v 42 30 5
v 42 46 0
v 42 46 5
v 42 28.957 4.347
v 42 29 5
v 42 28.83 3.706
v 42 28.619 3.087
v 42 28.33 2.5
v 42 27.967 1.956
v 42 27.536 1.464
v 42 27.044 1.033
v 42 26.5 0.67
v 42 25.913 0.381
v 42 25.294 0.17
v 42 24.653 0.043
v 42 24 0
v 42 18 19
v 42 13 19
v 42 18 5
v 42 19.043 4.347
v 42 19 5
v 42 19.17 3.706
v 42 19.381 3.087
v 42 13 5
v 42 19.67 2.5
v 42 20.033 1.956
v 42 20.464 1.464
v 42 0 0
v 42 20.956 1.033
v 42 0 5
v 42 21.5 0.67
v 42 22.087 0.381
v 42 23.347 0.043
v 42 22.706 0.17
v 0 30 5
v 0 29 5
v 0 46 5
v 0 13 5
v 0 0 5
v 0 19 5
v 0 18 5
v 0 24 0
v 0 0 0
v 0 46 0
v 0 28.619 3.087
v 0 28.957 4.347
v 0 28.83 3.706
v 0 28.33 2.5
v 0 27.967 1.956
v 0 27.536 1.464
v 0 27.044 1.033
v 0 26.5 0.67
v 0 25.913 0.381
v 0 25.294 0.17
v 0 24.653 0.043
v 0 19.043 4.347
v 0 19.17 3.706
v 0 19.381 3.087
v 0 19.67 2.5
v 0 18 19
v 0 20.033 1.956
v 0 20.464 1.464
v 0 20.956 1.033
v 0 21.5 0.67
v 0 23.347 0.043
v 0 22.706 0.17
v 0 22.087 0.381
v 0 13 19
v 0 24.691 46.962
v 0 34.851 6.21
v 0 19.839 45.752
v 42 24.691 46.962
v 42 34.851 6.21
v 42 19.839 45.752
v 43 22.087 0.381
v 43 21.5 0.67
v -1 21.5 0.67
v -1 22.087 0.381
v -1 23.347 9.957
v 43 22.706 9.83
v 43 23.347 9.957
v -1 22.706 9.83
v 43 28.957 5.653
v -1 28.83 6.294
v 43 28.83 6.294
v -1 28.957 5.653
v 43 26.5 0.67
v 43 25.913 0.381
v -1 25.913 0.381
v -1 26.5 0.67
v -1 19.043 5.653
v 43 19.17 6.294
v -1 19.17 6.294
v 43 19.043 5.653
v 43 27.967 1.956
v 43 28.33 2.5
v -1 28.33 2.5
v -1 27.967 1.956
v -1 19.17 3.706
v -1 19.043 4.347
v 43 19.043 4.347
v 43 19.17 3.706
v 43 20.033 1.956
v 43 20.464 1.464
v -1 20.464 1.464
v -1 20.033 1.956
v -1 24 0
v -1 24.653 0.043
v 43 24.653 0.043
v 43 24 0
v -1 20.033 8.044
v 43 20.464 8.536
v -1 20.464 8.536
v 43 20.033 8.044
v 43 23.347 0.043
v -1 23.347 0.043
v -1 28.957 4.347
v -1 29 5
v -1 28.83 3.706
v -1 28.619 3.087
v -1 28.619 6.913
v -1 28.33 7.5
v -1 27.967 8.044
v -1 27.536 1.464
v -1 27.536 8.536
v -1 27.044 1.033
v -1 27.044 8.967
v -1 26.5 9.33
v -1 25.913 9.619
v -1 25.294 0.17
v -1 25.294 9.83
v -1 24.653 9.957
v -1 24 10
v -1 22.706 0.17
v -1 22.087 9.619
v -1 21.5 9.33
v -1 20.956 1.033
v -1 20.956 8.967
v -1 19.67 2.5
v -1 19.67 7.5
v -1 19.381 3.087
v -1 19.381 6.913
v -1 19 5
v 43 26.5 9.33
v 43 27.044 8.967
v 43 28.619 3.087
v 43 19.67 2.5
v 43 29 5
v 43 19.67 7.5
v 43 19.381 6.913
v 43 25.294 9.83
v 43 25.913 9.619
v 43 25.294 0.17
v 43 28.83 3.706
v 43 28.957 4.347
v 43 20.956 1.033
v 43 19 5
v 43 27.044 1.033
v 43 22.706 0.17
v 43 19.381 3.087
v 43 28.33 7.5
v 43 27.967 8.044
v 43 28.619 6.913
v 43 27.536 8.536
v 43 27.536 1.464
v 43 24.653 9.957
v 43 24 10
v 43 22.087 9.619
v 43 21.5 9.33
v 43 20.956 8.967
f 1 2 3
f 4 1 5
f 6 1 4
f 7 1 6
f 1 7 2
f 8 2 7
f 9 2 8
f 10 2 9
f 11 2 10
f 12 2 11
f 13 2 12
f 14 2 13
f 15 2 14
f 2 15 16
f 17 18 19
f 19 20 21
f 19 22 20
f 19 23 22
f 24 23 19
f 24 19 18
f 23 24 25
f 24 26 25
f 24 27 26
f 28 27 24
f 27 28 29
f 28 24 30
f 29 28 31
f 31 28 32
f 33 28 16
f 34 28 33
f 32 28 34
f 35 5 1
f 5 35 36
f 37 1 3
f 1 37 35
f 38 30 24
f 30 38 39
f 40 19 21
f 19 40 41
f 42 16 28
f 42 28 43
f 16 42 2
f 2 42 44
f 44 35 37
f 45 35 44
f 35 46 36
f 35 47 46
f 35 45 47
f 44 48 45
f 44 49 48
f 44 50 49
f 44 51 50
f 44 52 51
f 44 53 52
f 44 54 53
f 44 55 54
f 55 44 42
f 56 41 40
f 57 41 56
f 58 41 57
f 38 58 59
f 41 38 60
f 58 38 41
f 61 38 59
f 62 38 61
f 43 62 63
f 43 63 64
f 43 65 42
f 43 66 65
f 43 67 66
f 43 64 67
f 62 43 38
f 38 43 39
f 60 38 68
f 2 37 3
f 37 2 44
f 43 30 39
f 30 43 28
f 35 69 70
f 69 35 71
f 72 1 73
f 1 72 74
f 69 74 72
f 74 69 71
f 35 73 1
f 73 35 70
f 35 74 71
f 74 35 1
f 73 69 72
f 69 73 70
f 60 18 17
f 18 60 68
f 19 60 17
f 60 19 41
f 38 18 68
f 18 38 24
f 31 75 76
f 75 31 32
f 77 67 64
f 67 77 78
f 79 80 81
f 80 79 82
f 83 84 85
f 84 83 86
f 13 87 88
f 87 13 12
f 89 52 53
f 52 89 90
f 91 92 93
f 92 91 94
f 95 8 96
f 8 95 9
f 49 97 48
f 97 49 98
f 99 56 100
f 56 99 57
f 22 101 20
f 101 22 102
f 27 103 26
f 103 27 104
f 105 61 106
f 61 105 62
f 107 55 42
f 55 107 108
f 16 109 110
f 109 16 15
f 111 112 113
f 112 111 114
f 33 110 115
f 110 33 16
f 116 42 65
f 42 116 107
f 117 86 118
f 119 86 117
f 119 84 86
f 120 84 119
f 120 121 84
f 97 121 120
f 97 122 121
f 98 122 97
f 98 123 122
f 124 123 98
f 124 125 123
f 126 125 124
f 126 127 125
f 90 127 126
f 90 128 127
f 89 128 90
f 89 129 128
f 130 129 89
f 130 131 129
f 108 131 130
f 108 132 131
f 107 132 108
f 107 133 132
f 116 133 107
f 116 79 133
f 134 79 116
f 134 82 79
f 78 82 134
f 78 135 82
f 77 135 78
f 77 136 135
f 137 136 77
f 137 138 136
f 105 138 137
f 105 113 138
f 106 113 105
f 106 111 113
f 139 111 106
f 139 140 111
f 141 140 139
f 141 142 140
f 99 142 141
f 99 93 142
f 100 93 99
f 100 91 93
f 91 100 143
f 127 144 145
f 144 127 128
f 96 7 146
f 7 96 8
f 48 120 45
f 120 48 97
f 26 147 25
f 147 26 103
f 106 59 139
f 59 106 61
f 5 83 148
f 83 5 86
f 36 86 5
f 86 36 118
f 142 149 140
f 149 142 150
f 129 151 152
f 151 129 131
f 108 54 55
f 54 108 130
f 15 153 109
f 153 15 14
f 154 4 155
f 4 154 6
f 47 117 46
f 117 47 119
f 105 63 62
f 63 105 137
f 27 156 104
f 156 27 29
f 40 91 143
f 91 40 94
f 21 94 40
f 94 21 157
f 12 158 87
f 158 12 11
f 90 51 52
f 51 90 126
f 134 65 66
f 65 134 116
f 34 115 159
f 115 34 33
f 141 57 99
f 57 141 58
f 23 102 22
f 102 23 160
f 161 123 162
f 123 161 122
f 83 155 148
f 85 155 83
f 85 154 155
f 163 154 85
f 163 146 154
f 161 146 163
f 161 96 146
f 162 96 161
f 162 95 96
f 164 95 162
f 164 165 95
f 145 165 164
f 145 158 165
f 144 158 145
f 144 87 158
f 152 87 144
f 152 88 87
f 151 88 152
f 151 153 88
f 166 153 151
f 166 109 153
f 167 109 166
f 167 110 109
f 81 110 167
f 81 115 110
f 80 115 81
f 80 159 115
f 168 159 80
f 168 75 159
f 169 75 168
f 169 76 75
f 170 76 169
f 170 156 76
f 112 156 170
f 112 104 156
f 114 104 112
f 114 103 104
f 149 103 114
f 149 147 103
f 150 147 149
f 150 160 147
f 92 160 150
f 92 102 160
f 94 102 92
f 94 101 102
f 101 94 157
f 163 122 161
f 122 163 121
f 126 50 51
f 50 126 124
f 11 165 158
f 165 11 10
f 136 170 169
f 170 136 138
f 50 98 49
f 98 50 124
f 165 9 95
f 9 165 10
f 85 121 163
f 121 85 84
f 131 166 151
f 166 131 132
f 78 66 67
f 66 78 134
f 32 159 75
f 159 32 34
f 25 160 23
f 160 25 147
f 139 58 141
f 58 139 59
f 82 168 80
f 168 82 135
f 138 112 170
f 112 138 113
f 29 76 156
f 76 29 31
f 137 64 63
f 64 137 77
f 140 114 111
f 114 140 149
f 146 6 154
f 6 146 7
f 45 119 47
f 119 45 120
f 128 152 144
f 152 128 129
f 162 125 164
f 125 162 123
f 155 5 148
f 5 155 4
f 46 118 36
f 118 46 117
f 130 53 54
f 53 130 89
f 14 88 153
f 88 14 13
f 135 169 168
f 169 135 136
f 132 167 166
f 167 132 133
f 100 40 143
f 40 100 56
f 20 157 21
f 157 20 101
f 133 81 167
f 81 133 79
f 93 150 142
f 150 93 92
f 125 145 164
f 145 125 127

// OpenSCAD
// =====================================================================
//  DESK SETUP PACK  — part = "earbuds_stand" | "key_mail" | "cable_drop"
//  Units mm. No supports.
// =====================================================================
part = "earbuds_stand";
$fn = 48;

// 1. Earbuds / AirPods / small-device stand
module earbuds_stand() {
  cube([42, 46, 5]);                                    // base
  translate([0, 30, 5]) rotate([14,0,0]) cube([42, 5, 42]);  // back support (leans 14°)
  translate([0, 13, 5]) cube([42, 5, 14]);              // front lip
  // cable pass-through
  translate([21, 24, 5]) rotate([0,90,0]) cylinder(h = 44, r = 5, center = true);
}

// 2. Wall key + mail organizer: back plate + mail pocket + 3 key pegs
module key_mail() {
  W = 110; plateH = 95; t = 4;
  difference() {
    cube([W, t, plateH]);                               // back plate
    for (z = [plateH-12, 12]) translate([W/2, -1, z]) rotate([-90,0,0]) cylinder(h = t+2, r = 2);  // screw holes
  }
  // mail pocket (open top), front of plate
  pocketH = 48; pocketD = 38; w = 3;
  translate([0, t, 28]) difference() {
    cube([W, pocketD, pocketH]);
    translate([w, w, w]) cube([W - 2*w, pocketD, pocketH]);   // hollow + open top
  }
  // 3 key pegs below the pocket
  for (x = [W*0.2, W*0.5, W*0.8])
    translate([x, t, 14]) rotate([-90,0,0]) { cylinder(h = 16, r = 3); translate([0,0,16]) sphere(r = 4.5); }
}

// 3. Desk-edge cable drop clip: clamps over a desktop edge; cable drops into the top notch
module cable_drop() {
  w = 24; gap = 22; arm = 6; depth = 40; H = gap + 2*arm;   // gap = desktop thickness
  difference() {
    cube([w, depth, H]);
    translate([-1, 0, arm]) cube([w + 2, depth - 3, gap]);          // mouth (opens at front, grips desk edge)
    translate([w/2, 0, H]) rotate([0,90,0]) cylinder(h = w + 2, r = 3.5, center = true);  // cable U-notch on top front
  }
}

if (part == "earbuds_stand")    earbuds_stand();
else if (part == "key_mail")    key_mail();
else if (part == "cable_drop")  cable_drop();
